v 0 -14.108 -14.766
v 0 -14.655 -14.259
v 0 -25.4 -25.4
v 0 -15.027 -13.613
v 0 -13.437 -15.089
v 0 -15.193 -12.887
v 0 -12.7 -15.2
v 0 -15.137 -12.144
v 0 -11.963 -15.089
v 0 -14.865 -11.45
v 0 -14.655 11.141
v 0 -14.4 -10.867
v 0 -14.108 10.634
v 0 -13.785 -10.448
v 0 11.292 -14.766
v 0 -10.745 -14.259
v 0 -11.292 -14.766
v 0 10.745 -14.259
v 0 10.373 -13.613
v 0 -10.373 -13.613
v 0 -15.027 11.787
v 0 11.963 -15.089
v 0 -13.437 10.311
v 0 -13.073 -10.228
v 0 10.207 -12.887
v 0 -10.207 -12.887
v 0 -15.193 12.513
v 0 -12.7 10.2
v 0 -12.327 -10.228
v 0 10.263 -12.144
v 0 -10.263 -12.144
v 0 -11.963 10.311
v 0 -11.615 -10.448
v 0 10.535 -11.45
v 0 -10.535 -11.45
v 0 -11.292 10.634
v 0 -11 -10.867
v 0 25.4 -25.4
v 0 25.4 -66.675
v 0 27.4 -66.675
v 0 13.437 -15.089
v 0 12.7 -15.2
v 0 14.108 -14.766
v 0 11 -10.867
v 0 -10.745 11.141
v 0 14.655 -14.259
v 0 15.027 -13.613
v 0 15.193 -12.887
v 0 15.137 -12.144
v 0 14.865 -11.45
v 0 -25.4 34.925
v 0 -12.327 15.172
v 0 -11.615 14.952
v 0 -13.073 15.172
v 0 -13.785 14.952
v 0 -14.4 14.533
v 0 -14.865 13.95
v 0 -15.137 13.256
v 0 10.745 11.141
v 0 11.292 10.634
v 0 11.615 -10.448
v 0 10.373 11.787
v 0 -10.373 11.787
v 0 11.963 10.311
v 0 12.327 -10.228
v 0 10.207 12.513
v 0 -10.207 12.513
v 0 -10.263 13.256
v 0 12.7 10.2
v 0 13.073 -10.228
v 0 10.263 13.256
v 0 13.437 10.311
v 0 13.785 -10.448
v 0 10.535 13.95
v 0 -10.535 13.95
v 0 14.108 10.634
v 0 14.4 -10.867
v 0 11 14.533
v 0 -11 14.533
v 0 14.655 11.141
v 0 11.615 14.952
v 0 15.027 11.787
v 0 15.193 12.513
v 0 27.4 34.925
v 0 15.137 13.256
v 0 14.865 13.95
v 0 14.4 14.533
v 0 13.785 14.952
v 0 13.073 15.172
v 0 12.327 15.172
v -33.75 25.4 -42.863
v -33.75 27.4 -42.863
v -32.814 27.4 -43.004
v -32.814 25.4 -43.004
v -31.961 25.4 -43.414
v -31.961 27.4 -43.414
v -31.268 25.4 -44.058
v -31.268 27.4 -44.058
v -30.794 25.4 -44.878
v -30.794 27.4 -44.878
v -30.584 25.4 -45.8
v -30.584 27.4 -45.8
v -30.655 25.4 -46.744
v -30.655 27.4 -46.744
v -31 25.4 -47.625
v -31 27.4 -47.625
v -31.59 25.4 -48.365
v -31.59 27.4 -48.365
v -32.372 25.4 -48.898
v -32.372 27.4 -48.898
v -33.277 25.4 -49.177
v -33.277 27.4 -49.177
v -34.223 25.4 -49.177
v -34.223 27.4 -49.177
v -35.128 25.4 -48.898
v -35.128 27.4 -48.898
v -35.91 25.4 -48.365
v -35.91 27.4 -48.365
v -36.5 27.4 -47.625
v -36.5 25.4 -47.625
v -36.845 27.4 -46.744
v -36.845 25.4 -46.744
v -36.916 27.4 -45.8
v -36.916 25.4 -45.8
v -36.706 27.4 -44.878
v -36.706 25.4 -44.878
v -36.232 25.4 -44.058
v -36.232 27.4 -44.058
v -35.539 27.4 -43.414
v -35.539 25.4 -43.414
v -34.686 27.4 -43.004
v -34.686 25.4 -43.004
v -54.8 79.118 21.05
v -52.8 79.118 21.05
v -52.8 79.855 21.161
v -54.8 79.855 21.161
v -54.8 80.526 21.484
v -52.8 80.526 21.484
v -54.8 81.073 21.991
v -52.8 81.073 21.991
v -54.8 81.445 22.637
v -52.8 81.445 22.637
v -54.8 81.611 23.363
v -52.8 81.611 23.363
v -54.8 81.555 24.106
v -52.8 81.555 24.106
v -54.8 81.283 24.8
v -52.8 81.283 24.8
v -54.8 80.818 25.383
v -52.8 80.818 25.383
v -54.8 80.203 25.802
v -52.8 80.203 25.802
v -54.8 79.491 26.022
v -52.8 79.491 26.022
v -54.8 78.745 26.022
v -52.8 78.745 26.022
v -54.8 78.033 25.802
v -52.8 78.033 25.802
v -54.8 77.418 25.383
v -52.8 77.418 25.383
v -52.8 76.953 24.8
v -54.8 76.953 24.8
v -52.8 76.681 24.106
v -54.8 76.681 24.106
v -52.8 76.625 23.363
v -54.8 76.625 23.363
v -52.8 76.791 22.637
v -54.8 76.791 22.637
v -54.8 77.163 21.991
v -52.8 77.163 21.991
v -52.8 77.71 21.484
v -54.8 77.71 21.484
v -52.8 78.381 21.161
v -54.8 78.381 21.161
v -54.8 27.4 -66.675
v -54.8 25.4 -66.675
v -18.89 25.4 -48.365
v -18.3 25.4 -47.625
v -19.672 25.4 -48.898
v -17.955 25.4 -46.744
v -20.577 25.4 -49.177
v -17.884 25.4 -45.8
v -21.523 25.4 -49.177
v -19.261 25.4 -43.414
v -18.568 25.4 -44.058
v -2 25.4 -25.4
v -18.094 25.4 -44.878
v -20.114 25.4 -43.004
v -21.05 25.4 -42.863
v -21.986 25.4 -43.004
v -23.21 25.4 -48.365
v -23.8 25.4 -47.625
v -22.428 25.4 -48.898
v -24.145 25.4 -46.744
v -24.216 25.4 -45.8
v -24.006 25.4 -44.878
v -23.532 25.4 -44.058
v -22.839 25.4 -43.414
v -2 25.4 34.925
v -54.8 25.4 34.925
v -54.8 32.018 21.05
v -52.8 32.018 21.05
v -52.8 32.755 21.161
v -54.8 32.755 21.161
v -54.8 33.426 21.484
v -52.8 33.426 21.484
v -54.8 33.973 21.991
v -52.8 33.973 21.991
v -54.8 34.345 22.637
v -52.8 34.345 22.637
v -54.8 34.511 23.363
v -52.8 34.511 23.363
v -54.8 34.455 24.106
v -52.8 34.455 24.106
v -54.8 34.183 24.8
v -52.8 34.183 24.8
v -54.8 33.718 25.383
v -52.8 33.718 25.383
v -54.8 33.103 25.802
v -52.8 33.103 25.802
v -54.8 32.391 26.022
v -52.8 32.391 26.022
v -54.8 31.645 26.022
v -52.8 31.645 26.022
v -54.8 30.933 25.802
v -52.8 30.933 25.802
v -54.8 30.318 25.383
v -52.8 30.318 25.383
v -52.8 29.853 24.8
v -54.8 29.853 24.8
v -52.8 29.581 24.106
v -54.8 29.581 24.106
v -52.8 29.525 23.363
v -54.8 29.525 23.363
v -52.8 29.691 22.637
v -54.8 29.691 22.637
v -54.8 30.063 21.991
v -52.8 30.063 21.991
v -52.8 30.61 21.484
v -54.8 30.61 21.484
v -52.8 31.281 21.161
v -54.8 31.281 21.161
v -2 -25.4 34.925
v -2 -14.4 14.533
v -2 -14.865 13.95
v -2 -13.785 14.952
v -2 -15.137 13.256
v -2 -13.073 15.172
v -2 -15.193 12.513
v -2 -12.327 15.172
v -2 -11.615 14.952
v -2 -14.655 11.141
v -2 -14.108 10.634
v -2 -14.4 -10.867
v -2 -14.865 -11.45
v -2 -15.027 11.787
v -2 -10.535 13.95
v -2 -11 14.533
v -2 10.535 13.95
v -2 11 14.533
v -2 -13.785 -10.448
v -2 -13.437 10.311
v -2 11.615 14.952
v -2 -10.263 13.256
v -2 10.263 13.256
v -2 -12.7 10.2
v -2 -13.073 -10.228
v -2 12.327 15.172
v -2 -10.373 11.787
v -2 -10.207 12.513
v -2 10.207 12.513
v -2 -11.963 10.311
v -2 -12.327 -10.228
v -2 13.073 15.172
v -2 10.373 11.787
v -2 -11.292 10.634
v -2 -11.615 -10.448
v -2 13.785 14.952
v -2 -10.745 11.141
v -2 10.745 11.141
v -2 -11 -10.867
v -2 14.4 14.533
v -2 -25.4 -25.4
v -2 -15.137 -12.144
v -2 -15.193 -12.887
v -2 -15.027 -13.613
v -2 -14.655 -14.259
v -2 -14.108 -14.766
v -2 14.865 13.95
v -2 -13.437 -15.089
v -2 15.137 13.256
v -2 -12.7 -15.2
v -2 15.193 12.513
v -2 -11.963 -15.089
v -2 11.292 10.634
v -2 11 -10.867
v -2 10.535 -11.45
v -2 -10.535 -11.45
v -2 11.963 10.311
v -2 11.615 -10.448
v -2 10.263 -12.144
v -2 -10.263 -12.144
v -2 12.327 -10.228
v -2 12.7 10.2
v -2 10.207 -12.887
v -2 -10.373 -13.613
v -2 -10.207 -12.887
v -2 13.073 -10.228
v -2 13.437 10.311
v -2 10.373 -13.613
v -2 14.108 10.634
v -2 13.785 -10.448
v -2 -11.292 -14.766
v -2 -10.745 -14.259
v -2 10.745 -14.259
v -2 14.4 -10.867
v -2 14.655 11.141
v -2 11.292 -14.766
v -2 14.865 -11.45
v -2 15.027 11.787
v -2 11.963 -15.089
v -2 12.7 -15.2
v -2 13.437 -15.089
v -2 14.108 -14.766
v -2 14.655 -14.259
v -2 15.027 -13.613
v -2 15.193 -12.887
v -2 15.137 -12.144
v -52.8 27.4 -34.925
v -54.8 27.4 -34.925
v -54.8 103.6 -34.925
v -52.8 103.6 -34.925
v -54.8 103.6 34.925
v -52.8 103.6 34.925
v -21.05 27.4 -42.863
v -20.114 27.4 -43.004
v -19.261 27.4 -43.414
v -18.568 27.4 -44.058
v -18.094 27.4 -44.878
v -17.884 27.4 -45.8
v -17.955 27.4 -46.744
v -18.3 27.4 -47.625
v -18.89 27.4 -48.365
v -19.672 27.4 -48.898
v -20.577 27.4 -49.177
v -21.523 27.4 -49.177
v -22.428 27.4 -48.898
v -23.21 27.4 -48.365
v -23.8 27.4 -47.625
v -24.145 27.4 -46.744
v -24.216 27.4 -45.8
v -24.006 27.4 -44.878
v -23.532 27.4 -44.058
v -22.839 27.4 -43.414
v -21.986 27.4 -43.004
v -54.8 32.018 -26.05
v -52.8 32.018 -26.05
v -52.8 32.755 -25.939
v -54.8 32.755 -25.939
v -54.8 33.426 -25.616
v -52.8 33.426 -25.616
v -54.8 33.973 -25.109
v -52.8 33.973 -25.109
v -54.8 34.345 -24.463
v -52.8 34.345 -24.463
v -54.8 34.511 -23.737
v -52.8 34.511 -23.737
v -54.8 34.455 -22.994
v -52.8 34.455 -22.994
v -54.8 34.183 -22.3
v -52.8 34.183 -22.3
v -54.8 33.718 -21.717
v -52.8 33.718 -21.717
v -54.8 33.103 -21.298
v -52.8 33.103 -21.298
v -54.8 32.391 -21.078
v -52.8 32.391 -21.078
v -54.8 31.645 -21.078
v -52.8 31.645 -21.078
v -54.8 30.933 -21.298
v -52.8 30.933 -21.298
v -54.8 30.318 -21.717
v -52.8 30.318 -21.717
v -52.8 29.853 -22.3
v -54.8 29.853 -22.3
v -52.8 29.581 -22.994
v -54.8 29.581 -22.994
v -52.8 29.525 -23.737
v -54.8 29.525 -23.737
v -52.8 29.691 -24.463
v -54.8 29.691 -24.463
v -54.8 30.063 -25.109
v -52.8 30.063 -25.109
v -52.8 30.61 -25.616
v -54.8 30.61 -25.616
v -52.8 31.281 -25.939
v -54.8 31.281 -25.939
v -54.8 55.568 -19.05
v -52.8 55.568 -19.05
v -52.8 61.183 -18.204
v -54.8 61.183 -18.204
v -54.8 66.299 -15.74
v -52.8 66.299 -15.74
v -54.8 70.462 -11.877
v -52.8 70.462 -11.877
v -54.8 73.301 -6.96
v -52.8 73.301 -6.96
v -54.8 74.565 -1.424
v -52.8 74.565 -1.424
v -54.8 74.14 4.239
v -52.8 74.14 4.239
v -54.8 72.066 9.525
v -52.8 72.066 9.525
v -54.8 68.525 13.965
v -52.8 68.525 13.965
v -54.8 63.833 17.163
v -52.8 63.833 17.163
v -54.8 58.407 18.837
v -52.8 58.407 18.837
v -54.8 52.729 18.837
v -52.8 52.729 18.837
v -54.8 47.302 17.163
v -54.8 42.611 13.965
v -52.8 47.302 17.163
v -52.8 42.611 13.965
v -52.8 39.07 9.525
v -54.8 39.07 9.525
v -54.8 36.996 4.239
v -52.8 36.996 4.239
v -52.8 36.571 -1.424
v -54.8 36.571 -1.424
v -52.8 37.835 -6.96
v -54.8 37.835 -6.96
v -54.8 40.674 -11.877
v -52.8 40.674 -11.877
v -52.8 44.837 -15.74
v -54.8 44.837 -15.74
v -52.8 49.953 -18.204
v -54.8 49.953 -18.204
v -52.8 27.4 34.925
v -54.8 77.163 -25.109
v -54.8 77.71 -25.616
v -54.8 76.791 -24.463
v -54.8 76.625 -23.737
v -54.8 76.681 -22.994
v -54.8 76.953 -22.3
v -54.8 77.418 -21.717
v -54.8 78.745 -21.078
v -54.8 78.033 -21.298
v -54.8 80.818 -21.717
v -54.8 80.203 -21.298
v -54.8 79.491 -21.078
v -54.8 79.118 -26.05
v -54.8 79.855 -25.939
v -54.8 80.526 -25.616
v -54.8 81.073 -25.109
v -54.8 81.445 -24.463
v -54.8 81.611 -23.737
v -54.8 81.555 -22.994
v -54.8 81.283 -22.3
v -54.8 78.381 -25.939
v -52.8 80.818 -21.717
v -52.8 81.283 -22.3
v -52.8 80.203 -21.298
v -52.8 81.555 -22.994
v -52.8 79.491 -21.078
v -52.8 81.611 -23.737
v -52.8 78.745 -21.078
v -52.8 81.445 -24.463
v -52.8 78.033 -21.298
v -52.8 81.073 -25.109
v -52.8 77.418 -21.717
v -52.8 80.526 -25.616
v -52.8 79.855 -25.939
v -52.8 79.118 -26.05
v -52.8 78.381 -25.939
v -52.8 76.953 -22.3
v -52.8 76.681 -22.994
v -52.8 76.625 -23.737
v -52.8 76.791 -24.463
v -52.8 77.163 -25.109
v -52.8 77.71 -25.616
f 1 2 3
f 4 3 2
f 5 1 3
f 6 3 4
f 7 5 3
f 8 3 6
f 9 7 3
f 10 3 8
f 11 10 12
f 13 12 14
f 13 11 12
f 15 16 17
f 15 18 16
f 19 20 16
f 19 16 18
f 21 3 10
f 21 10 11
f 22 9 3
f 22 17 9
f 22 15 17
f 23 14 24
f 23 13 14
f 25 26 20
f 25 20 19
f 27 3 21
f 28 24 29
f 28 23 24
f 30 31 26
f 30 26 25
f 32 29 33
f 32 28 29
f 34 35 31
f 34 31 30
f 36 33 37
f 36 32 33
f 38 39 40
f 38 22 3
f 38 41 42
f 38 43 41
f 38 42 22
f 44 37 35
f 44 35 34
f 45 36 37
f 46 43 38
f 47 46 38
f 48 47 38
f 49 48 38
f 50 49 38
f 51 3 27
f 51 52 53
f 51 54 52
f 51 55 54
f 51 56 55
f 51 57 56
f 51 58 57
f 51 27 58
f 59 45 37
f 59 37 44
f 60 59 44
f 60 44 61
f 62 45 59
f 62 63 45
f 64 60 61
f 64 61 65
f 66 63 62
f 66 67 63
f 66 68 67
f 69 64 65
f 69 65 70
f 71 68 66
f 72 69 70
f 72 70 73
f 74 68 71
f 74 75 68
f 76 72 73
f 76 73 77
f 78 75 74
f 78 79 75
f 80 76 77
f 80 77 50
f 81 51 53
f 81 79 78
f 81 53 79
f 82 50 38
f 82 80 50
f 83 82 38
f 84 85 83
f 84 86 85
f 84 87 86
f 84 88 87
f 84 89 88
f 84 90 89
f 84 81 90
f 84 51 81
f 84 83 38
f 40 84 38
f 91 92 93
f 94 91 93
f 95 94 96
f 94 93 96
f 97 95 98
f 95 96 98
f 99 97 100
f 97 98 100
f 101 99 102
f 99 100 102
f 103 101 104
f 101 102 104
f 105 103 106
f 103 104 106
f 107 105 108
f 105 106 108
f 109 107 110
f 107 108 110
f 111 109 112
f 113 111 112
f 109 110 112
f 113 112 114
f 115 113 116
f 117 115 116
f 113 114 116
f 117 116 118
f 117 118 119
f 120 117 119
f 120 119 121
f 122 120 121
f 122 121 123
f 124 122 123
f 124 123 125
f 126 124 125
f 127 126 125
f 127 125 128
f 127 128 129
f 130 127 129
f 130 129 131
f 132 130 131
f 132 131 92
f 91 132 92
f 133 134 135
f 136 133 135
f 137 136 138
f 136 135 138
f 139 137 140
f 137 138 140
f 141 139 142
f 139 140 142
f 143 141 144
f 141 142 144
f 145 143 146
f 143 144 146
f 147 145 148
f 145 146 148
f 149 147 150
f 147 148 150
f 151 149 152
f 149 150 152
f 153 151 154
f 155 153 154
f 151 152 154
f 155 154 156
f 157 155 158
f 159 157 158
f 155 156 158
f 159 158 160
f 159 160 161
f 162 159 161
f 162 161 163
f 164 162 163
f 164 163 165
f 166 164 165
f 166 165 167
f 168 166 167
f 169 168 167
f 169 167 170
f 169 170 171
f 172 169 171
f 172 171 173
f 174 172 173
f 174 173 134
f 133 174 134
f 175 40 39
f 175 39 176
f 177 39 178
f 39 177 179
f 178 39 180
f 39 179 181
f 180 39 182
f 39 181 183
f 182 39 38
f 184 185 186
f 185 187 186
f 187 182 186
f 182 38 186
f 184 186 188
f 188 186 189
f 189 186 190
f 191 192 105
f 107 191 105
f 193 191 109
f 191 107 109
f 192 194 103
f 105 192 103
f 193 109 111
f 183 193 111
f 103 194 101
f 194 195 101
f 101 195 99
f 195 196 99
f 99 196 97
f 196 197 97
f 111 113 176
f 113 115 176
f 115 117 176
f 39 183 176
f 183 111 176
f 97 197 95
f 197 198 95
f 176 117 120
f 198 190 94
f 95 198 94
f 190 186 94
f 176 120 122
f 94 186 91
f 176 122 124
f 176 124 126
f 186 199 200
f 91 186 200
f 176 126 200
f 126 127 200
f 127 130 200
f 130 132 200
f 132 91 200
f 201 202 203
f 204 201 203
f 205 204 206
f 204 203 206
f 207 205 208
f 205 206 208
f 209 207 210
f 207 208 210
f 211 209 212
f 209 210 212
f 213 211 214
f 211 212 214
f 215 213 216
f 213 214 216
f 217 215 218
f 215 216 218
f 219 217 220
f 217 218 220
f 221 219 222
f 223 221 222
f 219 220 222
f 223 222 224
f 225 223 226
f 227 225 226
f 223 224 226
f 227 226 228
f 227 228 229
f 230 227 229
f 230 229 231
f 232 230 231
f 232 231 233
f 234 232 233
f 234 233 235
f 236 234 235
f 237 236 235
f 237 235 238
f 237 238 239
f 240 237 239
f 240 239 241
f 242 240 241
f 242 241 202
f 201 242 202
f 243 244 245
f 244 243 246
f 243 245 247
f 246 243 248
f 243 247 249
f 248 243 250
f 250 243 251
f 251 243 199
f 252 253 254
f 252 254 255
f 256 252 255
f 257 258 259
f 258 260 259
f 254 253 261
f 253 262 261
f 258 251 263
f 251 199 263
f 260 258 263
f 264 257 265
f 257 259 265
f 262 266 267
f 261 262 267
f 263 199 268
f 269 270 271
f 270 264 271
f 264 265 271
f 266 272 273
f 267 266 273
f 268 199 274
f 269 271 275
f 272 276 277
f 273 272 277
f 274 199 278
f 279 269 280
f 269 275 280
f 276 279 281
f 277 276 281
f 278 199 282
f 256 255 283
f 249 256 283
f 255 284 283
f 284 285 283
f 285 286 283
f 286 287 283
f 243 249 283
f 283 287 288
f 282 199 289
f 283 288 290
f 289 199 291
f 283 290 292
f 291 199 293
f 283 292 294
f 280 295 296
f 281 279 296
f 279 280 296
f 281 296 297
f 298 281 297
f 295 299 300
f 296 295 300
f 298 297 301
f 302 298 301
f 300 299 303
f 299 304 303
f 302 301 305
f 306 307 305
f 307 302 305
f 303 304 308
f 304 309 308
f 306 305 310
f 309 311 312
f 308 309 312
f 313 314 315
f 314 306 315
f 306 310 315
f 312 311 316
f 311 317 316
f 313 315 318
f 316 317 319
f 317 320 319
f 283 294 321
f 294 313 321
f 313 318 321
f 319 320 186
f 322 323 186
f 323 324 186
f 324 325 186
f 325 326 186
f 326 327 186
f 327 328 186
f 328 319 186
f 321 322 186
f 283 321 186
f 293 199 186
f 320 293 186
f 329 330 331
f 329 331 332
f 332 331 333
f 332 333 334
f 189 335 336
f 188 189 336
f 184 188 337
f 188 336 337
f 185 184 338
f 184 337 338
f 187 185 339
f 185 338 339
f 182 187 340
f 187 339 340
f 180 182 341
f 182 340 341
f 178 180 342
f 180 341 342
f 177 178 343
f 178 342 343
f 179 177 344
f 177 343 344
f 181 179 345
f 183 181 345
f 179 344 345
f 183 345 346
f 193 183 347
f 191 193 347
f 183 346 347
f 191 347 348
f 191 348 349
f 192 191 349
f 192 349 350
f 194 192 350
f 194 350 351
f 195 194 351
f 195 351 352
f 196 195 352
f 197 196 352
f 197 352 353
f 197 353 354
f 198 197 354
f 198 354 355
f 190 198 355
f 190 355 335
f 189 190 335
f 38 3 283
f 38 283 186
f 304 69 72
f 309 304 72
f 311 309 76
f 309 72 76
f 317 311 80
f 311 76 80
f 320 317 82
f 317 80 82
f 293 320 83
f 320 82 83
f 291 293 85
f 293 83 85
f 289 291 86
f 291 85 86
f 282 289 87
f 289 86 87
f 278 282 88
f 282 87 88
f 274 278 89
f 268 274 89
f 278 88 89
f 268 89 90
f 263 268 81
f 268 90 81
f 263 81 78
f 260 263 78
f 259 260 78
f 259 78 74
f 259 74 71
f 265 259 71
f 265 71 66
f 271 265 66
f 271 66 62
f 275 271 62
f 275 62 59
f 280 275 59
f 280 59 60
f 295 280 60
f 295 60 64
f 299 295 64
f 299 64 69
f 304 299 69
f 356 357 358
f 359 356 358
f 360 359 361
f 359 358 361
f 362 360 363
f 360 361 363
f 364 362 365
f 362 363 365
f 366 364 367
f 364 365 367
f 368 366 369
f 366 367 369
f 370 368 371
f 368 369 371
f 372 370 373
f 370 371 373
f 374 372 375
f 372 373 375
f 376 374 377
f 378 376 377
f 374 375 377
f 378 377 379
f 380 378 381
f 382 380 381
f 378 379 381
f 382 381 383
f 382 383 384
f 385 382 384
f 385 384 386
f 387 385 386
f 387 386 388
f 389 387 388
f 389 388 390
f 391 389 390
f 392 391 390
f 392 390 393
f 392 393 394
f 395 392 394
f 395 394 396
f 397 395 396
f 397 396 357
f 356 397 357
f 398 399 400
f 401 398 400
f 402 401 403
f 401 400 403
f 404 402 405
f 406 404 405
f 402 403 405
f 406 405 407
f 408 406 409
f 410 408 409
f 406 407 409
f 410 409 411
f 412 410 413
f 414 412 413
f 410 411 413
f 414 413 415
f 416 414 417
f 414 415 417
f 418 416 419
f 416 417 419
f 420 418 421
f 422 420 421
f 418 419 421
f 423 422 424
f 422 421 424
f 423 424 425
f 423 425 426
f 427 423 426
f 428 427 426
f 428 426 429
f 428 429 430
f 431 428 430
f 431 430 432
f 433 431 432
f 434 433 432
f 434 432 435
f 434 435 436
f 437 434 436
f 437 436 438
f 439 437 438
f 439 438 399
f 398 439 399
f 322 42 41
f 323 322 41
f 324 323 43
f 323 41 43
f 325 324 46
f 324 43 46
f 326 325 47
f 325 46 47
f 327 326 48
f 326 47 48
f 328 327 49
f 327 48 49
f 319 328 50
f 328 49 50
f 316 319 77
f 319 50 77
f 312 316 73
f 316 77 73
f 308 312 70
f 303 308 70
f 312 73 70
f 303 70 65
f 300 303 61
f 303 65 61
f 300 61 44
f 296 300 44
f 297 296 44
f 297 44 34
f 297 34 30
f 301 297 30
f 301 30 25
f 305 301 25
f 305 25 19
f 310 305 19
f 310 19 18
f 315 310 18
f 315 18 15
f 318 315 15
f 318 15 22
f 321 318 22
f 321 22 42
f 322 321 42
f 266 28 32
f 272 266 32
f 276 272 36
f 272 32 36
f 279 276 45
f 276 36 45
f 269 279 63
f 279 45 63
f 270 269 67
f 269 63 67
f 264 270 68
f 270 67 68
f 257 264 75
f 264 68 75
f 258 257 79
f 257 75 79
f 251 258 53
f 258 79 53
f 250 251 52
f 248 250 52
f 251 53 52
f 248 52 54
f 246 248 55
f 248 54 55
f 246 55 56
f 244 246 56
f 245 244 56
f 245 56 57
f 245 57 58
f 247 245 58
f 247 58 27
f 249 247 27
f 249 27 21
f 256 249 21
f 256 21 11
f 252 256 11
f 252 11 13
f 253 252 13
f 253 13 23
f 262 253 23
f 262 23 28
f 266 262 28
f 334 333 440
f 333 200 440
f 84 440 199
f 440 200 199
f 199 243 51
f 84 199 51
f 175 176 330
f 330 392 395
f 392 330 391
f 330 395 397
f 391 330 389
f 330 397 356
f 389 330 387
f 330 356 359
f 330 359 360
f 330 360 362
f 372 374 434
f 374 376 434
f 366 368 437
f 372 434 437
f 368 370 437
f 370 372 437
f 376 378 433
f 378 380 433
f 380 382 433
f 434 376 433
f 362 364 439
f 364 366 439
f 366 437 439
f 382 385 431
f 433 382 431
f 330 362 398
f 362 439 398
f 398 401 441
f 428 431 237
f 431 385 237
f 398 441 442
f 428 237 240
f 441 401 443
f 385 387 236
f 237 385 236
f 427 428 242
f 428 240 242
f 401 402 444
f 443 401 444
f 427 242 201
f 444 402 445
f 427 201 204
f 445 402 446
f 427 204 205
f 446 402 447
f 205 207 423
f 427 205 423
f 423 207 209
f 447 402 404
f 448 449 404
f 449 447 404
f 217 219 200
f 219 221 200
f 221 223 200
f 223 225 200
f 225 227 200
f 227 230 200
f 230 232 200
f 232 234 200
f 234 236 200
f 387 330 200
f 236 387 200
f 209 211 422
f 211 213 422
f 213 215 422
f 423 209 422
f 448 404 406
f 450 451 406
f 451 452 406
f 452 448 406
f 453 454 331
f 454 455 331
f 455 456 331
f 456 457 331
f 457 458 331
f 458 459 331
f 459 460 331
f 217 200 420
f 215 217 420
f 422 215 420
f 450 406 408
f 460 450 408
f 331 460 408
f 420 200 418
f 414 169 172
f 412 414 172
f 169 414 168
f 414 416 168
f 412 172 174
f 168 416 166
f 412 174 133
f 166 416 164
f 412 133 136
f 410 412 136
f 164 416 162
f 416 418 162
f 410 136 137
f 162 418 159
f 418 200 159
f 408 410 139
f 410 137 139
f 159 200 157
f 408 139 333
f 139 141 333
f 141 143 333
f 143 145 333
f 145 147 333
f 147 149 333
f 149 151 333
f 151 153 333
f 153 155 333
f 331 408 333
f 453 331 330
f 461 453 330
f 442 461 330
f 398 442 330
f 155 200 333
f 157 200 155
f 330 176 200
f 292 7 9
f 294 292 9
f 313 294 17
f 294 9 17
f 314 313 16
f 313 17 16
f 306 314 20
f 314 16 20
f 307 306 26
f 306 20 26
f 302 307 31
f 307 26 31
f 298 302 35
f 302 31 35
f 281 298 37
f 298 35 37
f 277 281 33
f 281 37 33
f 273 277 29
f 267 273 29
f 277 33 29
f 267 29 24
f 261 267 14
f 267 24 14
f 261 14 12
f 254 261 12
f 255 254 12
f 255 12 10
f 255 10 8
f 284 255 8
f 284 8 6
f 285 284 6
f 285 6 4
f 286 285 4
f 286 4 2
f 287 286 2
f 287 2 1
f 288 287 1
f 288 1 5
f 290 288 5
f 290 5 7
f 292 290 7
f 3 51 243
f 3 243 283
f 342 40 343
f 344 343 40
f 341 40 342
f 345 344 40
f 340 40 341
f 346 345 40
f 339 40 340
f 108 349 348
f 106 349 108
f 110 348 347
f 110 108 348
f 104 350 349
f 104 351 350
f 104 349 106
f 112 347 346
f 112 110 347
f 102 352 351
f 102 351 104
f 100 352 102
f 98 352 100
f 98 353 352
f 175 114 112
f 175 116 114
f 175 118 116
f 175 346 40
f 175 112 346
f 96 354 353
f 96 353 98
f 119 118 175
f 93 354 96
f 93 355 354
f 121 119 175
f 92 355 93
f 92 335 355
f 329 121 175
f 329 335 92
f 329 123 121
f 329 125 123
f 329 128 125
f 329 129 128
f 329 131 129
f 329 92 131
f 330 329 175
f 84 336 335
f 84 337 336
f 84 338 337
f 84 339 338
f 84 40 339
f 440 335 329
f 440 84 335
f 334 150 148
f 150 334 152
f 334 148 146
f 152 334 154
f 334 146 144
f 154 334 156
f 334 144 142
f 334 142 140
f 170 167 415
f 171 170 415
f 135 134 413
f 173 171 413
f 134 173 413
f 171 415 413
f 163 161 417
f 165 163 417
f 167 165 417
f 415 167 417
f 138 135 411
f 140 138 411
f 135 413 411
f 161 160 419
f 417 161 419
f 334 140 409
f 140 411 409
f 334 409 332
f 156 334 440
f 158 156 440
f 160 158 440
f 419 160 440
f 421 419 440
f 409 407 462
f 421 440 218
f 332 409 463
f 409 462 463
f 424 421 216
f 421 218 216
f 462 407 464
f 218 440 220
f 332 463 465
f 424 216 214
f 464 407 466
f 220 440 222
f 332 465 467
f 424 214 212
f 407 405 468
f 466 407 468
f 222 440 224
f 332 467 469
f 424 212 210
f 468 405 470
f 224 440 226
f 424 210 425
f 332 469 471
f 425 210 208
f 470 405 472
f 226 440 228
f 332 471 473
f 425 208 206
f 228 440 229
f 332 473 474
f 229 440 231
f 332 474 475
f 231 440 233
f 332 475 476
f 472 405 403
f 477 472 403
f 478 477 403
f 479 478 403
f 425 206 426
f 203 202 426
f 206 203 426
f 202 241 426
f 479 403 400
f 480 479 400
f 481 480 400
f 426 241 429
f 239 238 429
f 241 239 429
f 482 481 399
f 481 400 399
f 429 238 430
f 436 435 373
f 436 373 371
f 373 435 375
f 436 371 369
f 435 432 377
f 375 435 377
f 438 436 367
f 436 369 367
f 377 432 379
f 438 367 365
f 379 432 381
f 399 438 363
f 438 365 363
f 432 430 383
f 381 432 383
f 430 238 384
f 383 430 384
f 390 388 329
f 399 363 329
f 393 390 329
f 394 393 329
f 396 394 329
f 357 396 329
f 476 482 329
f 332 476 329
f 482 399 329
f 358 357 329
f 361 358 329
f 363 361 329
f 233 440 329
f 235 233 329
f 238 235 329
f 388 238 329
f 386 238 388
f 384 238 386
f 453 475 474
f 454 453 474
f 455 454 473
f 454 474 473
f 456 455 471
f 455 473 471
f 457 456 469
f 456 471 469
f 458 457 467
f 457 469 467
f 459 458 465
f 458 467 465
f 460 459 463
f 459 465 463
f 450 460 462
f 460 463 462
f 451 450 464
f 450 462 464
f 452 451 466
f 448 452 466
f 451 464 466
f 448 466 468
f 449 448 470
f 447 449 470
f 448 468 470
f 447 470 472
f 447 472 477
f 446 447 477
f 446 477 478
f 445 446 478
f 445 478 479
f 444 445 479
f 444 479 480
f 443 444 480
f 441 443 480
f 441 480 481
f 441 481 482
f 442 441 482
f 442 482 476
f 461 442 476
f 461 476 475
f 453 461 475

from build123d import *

# Parameters (mm, degrees)
SKETCH1_W           = 69.85
SKETCH1_H           = 50.8
BOSS_EXTRUDE1_DEPTH = 2
SKETCH2_W           = 54.8
SKETCH2_H           = 69.85
BOSS_EXTRUDE2_DEPTH = 2
SKETCH3_W           = 2
SKETCH3_H           = 69.85
BOSS_EXTRUDE3_DEPTH = 76.2
SKETCH4_R           = 19.05
SKETCH4_R_2         = 2.5
CUT_EXTRUDE1_DEPTH  = 122.410689912
SKETCH5_R           = 2.5
SKETCH5_W           = 9.525
SKETCH5_H           = 52.8
CUT_EXTRUDE2_DEPTH  = 76.2
SKETCH6_W           = 54.8
SKETCH6_H           = 2
BOSS_EXTRUDE4_DEPTH = 41.275
SKETCH7_R           = 3.175
CUT_EXTRUDE3_DEPTH  = 116.130515612


with BuildPart() as part:
    # Sketch1 → Boss-Extrude1 (new body)
    with BuildSketch(Plane(origin=(0, 0, 0), x_dir=(0, 0, -1), z_dir=(1, 0, 0))):
        Rectangle(SKETCH1_W, SKETCH1_H)
    extrude(amount=-BOSS_EXTRUDE1_DEPTH)

    # Sketch2 → Boss-Extrude2 (add)
    with BuildSketch(Plane(origin=(0, 25.4, 0), x_dir=(1, 0, 0), z_dir=(0, 1, 0))):
        with Locations((-27.4, 0)):
            Rectangle(SKETCH2_W, SKETCH2_H)
    extrude(amount=BOSS_EXTRUDE2_DEPTH)

    # Sketch3 → Boss-Extrude3 (add)
    with BuildSketch(Plane(origin=(0, 27.4, 0), x_dir=(1, 0, 0), z_dir=(0, 1, 0))):
        with Locations((-53.8, 0)):
            Rectangle(SKETCH3_W, SKETCH3_H)
    extrude(amount=BOSS_EXTRUDE3_DEPTH)

    # Sketch4 → Cut-Extrude1 (cut, through all)
    with BuildSketch(Plane(origin=(-52.8, 0, 0), x_dir=(0, 0, -1), z_dir=(1, 0, 0))):
        with Locations((0, 55.567958179)):
            Circle(SKETCH4_R)
        with Locations((23.55, 79.117958179)):
            Circle(SKETCH4_R_2)
        with Locations((-23.55, 79.117958179)):
            Circle(SKETCH4_R_2)
        with Locations((-23.55, 32.017958179)):
            Circle(SKETCH4_R_2)
        with Locations((23.55, 32.017958179)):
            Circle(SKETCH4_R_2)
    extrude(amount=-CUT_EXTRUDE1_DEPTH, mode=Mode.SUBTRACT)

    # Sketch5 → Cut-Extrude2 (cut)
    with BuildSketch(Plane(origin=(0, 0, 0), x_dir=(0, 0, -1), z_dir=(1, 0, 0))):
        with Locations((-12.7, 12.7)):
            Circle(SKETCH5_R)
        with Locations((12.7, 12.7)):
            Circle(SKETCH5_R)
        with Locations((12.7, -12.7)):
            Circle(SKETCH5_R)
        with Locations((-12.7, -12.7)):
            Circle(SKETCH5_R)
        with Locations((30.1625, 1)):
            Rectangle(SKETCH5_W, SKETCH5_H)
    extrude(amount=-CUT_EXTRUDE2_DEPTH, mode=Mode.SUBTRACT)

    # Sketch6 → Boss-Extrude4 (add)
    with BuildSketch(Plane(origin=(0, 0, -25.4), x_dir=(-1, 0, 0), z_dir=(0, 0, -1))):
        with Locations((27.4, 26.4)):
            Rectangle(SKETCH6_W, SKETCH6_H)
    extrude(amount=BOSS_EXTRUDE4_DEPTH)

    # Sketch7 → Cut-Extrude3 (cut, through all)
    with BuildSketch(Plane(origin=(0, 27.4, 0), x_dir=(1, 0, 0), z_dir=(0, 1, 0))):
        with Locations(Location((-33.75, 46.0375, 0), (0, 0, 270))):
            Circle(SKETCH7_R)
        with Locations(Location((-21.05, 46.0375, 0), (0, 0, 270))):
            Circle(SKETCH7_R)
    extrude(amount=-CUT_EXTRUDE3_DEPTH, mode=Mode.SUBTRACT)


solid = part.part
